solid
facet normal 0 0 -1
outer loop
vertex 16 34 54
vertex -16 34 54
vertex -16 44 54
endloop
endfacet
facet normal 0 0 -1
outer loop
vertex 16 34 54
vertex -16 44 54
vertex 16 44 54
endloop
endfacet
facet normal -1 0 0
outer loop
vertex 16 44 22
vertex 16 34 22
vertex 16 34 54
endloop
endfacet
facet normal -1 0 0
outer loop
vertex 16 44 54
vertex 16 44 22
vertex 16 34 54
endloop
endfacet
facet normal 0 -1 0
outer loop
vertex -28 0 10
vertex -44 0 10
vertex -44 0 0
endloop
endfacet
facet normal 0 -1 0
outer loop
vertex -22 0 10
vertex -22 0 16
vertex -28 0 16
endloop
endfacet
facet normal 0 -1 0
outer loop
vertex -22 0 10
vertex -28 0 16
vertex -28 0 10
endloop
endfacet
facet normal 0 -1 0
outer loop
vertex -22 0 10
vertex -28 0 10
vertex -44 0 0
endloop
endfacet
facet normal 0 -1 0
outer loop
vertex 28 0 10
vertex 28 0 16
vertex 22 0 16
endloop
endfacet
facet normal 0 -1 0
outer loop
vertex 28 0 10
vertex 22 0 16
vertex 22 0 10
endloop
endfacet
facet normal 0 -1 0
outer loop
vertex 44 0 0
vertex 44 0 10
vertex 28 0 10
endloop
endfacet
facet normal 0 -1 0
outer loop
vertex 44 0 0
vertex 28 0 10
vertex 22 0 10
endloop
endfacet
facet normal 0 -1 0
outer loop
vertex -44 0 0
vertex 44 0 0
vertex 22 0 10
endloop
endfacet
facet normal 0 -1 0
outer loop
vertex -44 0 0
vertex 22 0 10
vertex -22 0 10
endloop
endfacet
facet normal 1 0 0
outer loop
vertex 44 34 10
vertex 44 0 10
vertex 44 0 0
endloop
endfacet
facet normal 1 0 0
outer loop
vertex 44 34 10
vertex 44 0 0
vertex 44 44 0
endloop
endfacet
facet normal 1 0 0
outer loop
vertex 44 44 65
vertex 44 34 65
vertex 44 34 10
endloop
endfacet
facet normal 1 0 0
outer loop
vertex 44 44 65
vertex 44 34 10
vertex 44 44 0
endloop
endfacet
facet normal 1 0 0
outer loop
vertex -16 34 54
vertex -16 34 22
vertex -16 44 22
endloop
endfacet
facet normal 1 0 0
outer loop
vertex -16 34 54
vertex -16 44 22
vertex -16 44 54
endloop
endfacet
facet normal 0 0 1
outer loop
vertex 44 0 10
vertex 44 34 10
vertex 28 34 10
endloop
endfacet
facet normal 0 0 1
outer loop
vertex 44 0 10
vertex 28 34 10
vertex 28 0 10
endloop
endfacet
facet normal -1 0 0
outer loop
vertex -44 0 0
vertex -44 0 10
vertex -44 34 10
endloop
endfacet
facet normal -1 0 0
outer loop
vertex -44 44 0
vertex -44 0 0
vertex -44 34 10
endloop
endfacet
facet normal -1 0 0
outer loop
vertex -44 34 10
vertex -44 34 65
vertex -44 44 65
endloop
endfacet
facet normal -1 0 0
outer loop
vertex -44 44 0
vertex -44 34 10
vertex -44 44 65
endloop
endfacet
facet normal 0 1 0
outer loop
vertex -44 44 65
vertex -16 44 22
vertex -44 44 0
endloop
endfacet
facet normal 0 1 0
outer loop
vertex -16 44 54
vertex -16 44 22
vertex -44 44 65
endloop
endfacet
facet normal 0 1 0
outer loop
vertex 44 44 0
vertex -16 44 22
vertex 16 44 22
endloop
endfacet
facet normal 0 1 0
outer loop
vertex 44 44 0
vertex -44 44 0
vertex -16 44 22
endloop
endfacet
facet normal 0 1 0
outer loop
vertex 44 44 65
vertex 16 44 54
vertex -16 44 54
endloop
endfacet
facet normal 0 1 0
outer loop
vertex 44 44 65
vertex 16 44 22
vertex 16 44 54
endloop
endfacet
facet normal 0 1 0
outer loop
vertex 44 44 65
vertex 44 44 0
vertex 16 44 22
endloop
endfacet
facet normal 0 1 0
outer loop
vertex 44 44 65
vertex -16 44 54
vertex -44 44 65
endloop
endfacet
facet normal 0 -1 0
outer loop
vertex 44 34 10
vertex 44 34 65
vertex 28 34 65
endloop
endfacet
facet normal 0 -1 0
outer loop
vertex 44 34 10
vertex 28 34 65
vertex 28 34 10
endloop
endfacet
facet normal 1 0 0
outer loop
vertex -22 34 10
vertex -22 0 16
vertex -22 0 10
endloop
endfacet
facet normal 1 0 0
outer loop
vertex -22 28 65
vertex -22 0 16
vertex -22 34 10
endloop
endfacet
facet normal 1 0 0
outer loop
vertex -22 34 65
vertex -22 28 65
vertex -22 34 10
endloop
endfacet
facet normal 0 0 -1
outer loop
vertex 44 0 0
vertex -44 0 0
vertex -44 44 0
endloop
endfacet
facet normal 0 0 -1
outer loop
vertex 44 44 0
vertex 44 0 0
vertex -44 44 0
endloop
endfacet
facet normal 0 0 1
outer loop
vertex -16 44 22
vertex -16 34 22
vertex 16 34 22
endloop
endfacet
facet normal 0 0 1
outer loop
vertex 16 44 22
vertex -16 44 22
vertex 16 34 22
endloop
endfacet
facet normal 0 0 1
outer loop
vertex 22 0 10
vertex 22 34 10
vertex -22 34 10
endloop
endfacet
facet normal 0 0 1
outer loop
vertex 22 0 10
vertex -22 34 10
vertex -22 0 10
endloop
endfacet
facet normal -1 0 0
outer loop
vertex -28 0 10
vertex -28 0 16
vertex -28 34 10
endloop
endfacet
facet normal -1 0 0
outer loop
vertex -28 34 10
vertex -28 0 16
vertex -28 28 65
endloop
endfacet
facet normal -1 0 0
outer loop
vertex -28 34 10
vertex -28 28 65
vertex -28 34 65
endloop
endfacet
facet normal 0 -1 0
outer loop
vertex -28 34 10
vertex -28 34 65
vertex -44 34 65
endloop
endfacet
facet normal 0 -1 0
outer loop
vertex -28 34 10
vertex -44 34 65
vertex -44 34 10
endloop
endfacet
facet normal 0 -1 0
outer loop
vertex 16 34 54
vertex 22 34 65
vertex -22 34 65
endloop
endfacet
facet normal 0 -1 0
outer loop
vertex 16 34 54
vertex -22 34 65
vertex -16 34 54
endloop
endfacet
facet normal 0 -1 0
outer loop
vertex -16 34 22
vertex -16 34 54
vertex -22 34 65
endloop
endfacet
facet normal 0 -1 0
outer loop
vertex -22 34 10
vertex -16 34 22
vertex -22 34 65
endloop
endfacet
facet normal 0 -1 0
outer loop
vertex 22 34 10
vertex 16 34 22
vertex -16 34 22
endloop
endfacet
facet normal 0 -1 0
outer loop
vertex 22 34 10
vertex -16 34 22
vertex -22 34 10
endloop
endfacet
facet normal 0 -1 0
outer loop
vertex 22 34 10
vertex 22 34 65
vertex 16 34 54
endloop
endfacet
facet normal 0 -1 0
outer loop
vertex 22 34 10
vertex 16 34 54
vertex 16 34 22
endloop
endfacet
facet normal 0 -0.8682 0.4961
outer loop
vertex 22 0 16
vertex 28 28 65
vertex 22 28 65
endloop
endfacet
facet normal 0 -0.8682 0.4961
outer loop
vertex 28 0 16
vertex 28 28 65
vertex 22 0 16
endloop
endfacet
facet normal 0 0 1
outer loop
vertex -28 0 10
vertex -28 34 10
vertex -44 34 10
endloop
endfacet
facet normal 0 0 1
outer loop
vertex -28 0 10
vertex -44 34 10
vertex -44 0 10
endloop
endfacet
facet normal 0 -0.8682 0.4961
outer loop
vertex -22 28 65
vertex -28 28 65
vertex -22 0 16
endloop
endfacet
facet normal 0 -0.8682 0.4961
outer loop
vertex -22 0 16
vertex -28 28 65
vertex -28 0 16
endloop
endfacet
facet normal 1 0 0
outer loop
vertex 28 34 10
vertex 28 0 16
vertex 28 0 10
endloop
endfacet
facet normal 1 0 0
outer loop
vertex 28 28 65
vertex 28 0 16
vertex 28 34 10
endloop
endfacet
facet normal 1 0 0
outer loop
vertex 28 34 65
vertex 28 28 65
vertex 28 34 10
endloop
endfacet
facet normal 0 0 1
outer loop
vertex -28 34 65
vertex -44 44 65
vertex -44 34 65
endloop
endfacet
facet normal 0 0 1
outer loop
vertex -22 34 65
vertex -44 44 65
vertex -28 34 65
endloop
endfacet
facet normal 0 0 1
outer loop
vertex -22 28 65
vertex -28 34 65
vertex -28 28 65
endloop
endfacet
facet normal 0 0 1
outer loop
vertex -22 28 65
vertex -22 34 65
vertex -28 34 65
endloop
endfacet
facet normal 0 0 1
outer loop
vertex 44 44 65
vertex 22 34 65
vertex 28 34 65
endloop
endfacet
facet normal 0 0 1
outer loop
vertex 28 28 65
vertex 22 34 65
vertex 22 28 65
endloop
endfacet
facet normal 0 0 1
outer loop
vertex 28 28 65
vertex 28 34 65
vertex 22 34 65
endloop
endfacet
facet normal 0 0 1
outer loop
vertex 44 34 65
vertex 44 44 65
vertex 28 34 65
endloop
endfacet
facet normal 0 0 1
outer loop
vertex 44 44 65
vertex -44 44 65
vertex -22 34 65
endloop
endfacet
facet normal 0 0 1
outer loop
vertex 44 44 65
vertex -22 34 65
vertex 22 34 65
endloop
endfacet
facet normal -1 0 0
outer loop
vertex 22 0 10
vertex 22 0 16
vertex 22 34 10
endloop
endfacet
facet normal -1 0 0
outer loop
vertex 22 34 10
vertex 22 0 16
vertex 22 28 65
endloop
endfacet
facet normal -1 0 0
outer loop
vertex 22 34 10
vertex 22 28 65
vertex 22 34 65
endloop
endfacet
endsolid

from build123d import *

# Parameters (mm, degrees)
F1_DEPTH = 44
F2_W     = 32
F2_H     = 32
F3_DEPTH = 10.001
F6_DEPTH = 3


# Not quite as in the source:
# - a pattern or mirror of a feature is missing from the dataset's text; its kind, count and spacing are read off the source's solid


with BuildPart() as f1:
    # F0 (on Right) → F1 (new body, symmetric)
    with BuildSketch(Plane.YZ):
        Polygon((0, 10), (0, 0), (44, 0), (44, 65), (34, 65), (34, 10), align=None)
    extrude(amount=F1_DEPTH, both=True)

    # F2 (on face) → F3 (cut, through all)
    with BuildSketch(Plane.XZ.offset(-34)):
        with Locations((0, 38)):
            Rectangle(F2_W, F2_H)
    extrude(amount=-F3_DEPTH, mode=Mode.SUBTRACT)

    # F5 (on offset) → F6 (join, symmetric)
    with BuildSketch(Plane.YZ.offset(25)):
        Polygon((34, 65), (28, 65), (0, 16), (0, 10), (34, 10), align=None)
    f6 = extrude(amount=F6_DEPTH, both=True)

    # F6_copies: F6 across plane
    add(f6.mirror(Plane(origin=(0, 0, 0), x_dir=(0, 0, -1), z_dir=(-1, 0, 0))))


solid = f1.part
